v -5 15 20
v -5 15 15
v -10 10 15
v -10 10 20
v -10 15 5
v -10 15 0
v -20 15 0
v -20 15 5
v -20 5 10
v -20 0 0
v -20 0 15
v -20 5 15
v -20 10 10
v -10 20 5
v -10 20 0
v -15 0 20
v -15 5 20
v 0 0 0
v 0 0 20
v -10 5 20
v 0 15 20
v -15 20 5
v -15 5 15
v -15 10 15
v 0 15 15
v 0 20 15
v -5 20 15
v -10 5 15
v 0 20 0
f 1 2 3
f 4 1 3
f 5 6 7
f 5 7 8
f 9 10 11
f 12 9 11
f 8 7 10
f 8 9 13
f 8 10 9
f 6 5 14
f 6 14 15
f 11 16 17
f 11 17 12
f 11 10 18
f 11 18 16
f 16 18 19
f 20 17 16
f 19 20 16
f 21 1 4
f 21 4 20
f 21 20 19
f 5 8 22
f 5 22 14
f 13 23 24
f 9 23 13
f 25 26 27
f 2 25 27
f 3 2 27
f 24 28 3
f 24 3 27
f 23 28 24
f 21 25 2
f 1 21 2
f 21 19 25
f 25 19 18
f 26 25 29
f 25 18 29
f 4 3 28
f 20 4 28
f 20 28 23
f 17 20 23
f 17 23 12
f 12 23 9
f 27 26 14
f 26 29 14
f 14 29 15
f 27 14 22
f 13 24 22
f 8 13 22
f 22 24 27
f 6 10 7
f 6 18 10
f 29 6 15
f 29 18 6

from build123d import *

# Parameters (mm, degrees)
BOSS_EXTRUDE1_DEPTH = 20
BOSS_EXTRUDE2_DEPTH = 20
CUT_EXTRUDE1_DEPTH  = 20
BOSS_EXTRUDE3_DEPTH = 5
BOSS_EXTRUDE4_DEPTH = 5
SKETCH7_W           = 5
SKETCH7_H           = 15
BOSS_EXTRUDE5_DEPTH = 10


with BuildPart() as part:
    # Sketch2 → Boss-Extrude1 (new body)
    with BuildSketch(Plane(origin=(0, 0, 0), x_dir=(1, 0, 0), z_dir=(0, 1, 0))):
        Polygon((-10, -5), (-10, 0), (0, 0), (0, -15), (-5, -15), (-15, -5), align=None)
    extrude(amount=BOSS_EXTRUDE1_DEPTH)

    # Sketch3 → Boss-Extrude2 (add)
    with BuildSketch(Plane(origin=(0, 0, 0), x_dir=(-1, 0, 0), z_dir=(0, -1, 0))):
        Polygon((15, -5), (5, -15), (15, -15), (20, -10), (20, -5), align=None)
    extrude(amount=-BOSS_EXTRUDE2_DEPTH)

    # 3DSketch2 → Cut-Extrude1 (cut, along a direction that is not the sketch's normal)
    with BuildSketch(Plane(origin=(-15, 20, 5), x_dir=(0, -0.7071067811865476, 0.7071067811865475), z_dir=(-0.5773502691896257, 0.5773502691896257, 0.5773502691896257))):
        Polygon((0, 0), (7.071067812, 12.247448714), (14.142135624, 0), (10.606601718, -6.123724357), (3.535533906, -6.123724357), align=None)
    extrude(amount=CUT_EXTRUDE1_DEPTH, dir=(0, 1, 0), mode=Mode.SUBTRACT)

    # Sketch5 → Boss-Extrude3 (add)
    with BuildSketch(Plane.XY.offset(15)):
        Polygon((0, 15), (-5, 15), (-10, 10), (-10, 5), (-15, 5), (-15, 0), (0, 0), align=None)
    extrude(amount=BOSS_EXTRUDE3_DEPTH)

    # Sketch6 → Boss-Extrude4 (add)
    with BuildSketch(Plane(origin=(0, 0, 0), x_dir=(-1, 0, 0), z_dir=(0, -1, 0))):
        Polygon((20, -10), (15, -15), (15, -20), (20, -15), align=None)
    extrude(amount=-BOSS_EXTRUDE4_DEPTH)

    # Sketch7 → Boss-Extrude5 (add)
    with BuildSketch(Plane.ZY.offset(10)):
        with Locations((2.5, 7.5)):
            Rectangle(SKETCH7_W, SKETCH7_H)
    extrude(amount=BOSS_EXTRUDE5_DEPTH)


solid = part.part
